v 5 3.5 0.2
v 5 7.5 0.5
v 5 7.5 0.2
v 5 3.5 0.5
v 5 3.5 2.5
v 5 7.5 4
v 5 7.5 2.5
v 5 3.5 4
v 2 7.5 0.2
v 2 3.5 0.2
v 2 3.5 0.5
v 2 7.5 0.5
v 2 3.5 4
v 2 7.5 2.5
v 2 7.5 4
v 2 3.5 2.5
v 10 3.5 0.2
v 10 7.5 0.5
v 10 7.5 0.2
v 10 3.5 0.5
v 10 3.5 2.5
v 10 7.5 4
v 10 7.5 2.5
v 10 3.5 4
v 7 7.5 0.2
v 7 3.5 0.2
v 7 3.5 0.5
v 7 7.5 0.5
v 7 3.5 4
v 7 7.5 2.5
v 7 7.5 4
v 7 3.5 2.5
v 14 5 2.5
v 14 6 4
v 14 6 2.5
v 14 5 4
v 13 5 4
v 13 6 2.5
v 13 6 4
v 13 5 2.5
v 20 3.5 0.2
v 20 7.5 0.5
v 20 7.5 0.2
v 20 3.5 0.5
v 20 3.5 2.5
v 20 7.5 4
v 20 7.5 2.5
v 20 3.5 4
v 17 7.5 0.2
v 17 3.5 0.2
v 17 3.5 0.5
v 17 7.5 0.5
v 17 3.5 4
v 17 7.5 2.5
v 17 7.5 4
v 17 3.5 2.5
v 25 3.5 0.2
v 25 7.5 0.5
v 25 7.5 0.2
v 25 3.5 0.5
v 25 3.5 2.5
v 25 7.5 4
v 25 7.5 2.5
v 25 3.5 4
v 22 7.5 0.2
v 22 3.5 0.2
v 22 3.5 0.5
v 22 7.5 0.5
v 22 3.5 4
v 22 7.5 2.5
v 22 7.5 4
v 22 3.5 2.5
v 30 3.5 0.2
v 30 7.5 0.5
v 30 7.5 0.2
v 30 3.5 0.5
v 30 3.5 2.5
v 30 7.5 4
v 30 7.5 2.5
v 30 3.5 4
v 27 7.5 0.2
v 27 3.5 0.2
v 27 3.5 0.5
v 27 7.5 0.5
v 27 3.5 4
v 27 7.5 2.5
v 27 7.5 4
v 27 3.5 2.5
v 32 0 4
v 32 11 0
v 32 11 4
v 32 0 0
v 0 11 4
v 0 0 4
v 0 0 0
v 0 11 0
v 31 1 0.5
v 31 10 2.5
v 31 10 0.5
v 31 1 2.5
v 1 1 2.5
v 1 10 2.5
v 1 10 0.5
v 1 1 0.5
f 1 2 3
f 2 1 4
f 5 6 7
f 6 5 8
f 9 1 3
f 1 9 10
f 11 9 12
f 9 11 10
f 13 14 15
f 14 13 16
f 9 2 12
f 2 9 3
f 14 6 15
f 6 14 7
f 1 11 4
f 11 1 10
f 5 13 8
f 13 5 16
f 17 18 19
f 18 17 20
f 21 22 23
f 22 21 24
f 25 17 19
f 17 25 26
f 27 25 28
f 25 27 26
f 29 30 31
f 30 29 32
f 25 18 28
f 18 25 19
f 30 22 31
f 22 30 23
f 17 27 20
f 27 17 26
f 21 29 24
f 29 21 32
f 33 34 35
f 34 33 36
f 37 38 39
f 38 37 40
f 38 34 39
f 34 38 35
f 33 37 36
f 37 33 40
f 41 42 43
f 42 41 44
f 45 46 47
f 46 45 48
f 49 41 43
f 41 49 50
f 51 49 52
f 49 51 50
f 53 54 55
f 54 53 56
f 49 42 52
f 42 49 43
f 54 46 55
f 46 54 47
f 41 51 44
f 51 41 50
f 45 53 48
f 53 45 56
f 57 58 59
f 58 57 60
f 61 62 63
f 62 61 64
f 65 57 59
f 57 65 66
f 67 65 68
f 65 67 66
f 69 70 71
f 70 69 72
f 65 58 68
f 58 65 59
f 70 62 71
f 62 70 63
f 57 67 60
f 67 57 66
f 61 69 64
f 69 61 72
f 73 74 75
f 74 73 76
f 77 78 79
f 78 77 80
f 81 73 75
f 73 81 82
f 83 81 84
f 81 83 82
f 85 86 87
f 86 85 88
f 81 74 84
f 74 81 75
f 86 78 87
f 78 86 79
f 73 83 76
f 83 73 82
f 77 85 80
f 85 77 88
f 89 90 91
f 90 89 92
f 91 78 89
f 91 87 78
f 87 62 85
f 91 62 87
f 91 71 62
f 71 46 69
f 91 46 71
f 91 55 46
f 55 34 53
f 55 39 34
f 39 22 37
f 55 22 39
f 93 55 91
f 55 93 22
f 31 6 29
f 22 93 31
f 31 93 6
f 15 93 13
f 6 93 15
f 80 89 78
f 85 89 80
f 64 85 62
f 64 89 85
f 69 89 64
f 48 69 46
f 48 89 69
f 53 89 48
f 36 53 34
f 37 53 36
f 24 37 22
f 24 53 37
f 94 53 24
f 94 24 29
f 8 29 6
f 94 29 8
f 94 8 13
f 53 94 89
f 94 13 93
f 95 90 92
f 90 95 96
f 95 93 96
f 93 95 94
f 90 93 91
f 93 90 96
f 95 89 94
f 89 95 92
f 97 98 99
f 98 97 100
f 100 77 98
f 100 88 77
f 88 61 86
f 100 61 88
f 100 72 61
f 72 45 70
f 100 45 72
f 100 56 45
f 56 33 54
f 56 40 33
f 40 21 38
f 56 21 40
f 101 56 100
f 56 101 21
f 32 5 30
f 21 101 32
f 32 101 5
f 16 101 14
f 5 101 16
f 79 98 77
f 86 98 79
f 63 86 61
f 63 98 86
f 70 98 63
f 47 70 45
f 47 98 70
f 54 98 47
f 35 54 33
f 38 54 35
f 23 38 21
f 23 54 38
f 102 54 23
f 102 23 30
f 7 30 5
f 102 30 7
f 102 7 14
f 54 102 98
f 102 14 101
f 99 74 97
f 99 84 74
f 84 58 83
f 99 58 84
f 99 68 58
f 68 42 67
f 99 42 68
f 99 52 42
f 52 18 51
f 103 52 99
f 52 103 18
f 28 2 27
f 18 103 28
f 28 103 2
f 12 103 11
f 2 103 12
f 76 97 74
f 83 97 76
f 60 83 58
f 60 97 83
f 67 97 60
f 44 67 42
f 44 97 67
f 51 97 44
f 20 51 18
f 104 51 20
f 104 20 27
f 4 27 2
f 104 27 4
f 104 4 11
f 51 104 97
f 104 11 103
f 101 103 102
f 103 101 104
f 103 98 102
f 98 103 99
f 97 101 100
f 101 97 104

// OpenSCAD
// Button height 
buttonHeight = 1;

// Number of buttons
buttonNum = 5;

// LDR variables

// Button Variables 

// Size
buttonX = 3;
buttonY = 4;
buttonZ = 4 + buttonHeight + 1; // Breadboard hight is 4.

// LDR Variables

// Size
LDRX = 1;
LDRY = 1;
LDRZ = 4 + buttonHeight;

// Space 

// between each button
spaceButton = 2;

// space between button and cylinder
spaceCylinder = 0.8;

// between LDR
spaceLDR = buttonX*2 + 3 * spaceButton + (buttonX - LDRX)/2; 


module Button(buttonNumber){
      // For y value keep it constant. 
      translate([buttonNumber*spaceButton + (buttonNumber-1)*buttonX, 3.5, 0.2]){
         // Size of button cube
         cube([buttonX, buttonY, buttonZ]);  
         
      }
}



difference() {
    // The breadboard.
    color([1,0,0]) cube([32, 11, 4]);
    
    for(i = [1:6]){
        if(i != 3){
            Button(i);
            // LDR at i == 3
        } else {
            translate([spaceLDR, 5, 1]){
             // Draw LDR Button
            cube([LDRX, LDRY, LDRZ]);  
            }
            
        }
    }
    
    translate([1, 1, 0.5]){
        color([1,0,0]) cube([30, 9, 2]);
    }
}
